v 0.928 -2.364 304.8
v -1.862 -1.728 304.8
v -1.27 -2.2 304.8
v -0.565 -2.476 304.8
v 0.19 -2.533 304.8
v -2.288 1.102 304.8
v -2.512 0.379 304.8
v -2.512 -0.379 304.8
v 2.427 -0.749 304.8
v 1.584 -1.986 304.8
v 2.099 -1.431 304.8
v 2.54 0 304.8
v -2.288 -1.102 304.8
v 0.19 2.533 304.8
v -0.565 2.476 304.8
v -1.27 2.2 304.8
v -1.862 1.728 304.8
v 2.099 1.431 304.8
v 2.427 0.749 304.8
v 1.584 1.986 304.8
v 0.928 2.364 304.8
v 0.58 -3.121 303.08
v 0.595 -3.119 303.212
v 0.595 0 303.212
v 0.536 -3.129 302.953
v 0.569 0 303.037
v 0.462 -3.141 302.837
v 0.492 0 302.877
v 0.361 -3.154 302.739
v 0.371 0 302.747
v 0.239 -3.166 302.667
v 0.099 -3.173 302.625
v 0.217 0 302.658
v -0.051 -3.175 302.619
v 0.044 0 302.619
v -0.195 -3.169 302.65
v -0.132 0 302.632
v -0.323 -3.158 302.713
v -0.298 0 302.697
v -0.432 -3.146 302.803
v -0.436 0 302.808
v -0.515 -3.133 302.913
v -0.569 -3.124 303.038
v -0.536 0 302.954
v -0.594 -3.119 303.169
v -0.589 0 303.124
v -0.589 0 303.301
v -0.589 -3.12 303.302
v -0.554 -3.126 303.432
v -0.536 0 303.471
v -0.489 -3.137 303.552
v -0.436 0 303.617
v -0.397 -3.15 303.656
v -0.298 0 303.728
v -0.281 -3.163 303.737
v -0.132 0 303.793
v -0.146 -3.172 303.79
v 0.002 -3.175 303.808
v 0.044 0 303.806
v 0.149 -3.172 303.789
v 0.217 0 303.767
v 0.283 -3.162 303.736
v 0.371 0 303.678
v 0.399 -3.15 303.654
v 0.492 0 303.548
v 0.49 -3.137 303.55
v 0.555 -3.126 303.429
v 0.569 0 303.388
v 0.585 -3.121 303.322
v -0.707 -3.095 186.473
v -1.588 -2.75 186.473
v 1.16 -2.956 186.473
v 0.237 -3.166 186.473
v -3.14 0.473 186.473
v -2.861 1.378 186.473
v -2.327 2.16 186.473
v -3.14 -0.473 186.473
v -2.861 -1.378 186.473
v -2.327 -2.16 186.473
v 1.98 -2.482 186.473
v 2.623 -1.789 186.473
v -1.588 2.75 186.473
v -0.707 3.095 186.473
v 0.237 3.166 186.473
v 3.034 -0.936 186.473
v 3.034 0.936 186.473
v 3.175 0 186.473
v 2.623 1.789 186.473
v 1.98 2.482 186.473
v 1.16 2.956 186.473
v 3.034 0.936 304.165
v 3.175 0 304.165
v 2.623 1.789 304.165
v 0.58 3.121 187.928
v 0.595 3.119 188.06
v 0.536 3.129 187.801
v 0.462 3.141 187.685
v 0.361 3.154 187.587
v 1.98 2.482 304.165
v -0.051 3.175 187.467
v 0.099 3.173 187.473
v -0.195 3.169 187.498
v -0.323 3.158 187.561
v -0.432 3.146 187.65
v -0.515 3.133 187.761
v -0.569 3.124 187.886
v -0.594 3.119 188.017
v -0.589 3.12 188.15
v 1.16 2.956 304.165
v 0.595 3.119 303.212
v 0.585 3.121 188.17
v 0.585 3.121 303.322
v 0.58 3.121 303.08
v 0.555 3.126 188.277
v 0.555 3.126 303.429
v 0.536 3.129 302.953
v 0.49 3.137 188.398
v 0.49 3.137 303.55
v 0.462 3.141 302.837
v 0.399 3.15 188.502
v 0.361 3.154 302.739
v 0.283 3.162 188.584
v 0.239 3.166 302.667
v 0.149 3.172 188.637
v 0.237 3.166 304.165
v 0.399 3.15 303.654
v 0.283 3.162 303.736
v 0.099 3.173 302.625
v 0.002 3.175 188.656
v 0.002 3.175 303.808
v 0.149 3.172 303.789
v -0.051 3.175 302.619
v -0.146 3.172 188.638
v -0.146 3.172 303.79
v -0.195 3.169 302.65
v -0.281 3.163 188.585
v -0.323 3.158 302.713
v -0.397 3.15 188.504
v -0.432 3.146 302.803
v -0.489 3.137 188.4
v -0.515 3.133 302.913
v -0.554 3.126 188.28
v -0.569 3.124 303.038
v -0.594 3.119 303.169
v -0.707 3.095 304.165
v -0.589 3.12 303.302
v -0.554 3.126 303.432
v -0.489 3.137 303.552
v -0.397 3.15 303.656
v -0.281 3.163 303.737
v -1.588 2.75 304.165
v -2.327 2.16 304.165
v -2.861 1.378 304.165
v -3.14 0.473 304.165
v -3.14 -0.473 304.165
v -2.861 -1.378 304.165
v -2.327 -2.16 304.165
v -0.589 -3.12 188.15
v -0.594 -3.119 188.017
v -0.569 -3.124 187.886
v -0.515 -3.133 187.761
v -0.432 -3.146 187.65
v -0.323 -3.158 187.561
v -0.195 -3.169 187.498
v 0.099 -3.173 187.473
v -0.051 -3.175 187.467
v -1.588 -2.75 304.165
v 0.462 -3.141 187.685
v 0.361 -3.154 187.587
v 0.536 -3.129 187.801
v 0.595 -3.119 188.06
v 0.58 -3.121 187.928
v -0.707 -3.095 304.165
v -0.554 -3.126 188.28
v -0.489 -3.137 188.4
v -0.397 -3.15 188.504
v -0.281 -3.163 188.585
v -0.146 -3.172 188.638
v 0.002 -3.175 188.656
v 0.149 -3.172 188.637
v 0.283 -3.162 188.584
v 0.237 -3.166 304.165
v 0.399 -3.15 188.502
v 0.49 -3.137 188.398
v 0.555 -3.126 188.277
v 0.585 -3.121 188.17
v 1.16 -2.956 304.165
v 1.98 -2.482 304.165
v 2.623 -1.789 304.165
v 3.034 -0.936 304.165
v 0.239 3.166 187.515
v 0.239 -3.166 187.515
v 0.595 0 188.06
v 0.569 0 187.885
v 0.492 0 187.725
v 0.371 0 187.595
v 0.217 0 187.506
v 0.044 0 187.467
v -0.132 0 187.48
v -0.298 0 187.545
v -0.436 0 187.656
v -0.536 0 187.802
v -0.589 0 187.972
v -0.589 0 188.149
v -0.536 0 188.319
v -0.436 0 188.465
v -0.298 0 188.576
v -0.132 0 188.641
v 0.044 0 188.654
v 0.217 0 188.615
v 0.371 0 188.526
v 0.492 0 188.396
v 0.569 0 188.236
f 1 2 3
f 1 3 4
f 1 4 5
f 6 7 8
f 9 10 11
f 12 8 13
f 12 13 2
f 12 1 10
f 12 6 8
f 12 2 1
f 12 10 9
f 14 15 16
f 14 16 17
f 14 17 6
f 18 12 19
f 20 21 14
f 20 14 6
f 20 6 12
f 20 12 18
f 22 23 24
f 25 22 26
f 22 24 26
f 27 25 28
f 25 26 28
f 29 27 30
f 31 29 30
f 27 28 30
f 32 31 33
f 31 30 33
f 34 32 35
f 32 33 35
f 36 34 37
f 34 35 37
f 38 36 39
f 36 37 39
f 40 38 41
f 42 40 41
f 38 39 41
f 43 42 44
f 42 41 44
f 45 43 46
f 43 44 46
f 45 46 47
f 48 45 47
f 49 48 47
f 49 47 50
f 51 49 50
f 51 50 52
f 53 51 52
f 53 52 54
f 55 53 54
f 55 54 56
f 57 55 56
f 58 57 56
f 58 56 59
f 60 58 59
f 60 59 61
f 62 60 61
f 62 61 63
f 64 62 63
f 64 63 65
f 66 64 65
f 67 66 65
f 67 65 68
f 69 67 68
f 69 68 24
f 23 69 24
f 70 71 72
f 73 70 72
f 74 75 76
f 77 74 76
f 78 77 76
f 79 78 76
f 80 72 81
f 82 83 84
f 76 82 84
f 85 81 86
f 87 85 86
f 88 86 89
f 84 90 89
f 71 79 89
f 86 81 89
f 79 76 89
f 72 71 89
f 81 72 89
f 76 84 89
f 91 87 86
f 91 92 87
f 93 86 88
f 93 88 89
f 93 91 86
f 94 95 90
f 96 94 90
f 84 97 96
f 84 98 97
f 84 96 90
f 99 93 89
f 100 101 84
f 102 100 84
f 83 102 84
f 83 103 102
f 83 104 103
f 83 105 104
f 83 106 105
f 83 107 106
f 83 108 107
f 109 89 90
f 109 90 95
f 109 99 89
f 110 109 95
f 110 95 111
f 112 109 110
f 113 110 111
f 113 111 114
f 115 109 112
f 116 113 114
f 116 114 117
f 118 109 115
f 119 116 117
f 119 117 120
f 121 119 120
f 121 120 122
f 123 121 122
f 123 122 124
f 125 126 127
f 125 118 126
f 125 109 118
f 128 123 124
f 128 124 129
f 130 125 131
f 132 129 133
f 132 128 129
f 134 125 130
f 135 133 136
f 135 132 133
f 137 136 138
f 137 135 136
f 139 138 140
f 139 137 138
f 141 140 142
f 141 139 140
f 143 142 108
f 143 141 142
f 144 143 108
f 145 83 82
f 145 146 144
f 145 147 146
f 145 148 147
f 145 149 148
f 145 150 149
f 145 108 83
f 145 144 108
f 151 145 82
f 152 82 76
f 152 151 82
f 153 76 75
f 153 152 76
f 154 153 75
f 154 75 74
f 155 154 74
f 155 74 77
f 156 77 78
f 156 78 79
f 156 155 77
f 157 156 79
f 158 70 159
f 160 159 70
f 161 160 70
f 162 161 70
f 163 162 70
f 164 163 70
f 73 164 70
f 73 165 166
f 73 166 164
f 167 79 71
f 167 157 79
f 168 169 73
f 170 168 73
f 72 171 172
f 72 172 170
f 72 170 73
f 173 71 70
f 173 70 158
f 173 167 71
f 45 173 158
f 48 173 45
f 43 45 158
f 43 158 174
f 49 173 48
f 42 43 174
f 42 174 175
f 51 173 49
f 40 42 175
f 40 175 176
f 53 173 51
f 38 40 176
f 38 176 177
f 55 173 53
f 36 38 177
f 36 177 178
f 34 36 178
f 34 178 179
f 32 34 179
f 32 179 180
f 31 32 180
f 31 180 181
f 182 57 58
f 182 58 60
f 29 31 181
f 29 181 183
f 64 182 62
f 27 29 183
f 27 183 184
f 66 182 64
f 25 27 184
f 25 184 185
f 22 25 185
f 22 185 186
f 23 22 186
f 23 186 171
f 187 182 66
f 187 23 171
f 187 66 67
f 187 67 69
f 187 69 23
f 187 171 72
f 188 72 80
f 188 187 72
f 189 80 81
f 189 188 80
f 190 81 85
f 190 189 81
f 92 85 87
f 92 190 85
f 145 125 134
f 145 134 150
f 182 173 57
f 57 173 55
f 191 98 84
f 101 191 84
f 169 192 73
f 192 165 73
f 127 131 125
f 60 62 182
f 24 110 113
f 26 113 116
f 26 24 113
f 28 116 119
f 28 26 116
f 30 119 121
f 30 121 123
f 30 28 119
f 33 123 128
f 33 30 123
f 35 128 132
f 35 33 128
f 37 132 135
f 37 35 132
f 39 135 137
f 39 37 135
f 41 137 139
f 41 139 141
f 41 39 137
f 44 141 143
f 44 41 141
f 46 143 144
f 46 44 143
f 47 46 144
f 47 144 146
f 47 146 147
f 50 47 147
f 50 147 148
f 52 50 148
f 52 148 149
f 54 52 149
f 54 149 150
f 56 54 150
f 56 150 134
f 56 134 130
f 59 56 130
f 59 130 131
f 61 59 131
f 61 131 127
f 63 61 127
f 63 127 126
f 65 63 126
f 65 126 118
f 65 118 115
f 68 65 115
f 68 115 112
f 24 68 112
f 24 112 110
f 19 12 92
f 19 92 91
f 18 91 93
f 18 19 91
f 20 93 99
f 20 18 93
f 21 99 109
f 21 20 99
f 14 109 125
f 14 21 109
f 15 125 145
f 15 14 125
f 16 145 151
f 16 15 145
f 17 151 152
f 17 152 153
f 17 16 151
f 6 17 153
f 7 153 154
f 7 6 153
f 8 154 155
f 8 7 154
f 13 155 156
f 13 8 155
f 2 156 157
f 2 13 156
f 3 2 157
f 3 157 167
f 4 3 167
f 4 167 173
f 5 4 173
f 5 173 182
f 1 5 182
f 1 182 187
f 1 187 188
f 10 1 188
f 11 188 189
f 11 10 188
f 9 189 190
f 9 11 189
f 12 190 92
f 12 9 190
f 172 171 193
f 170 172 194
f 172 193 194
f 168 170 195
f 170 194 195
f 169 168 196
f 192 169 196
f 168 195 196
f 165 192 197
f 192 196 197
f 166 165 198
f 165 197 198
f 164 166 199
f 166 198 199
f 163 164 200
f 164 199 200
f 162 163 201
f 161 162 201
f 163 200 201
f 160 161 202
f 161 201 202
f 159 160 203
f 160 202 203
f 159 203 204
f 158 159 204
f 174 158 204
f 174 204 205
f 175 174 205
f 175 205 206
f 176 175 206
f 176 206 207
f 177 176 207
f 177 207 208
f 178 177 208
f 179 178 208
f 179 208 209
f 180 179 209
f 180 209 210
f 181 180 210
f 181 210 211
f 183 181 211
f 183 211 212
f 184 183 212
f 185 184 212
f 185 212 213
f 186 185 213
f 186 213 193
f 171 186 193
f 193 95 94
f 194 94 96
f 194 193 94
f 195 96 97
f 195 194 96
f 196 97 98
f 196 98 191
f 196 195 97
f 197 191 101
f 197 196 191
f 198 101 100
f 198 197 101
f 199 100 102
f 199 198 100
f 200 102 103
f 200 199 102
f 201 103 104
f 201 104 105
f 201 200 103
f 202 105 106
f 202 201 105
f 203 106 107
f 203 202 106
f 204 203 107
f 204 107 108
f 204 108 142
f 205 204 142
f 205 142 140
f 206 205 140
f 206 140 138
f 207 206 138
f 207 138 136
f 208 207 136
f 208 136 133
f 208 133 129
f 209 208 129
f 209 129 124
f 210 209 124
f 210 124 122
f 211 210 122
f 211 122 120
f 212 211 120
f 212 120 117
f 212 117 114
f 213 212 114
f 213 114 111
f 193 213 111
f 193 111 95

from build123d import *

# Parameters (mm, degrees)
SKETCH3_R               = 3.175
BOSS_EXTRUDE1_DEPTH     = 304.8
CHAMFER1_SIZE           = 0.635
CUT_EXTRUDE1_START      = -118.327050112
SKETCH4_R               = 3.175
CUT_EXTRUDE1_DEPTH      = 492.272949888
SKETCH5_R               = 0.5953125
CUT_EXTRUDE2_DEPTH      = 4.175
CUT_EXTRUDE2_DEPTH_BACK = 4.175


with BuildPart() as part:
    # Sketch3 → Boss-Extrude1 (new body, symmetric)
    with BuildSketch(Plane.XY):
        Circle(SKETCH3_R)
    extrude(amount=BOSS_EXTRUDE1_DEPTH, both=True)

    # Chamfer1
    chamfer1_edges = [part.edges().sort_by_distance(p)[0] for p in [
        (-3.175, 0, -304.8),
        (-3.175, 0, 304.8),
    ]]
    chamfer(chamfer1_edges, length=CHAMFER1_SIZE)

    # Sketch4 → Cut-Extrude1 (cut, through all)
    with BuildSketch(Plane.XY.offset(304.8).offset(CUT_EXTRUDE1_START)):
        Circle(SKETCH4_R)
    extrude(amount=-CUT_EXTRUDE1_DEPTH, mode=Mode.SUBTRACT)

    # Sketch5 → Cut-Extrude2 (cut, two sides)
    with BuildSketch(Plane(origin=(0, 0, 0), x_dir=(1, 0, 0), z_dir=(0, 1, 0))) as cut_extrude2_sk:
        with Locations((0, -188.060449888)):
            Circle(SKETCH5_R)
        with Locations((0, -303.2125)):
            Circle(SKETCH5_R)
    extrude(amount=CUT_EXTRUDE2_DEPTH, mode=Mode.SUBTRACT)
    extrude(cut_extrude2_sk.sketch, amount=-CUT_EXTRUDE2_DEPTH_BACK, mode=Mode.SUBTRACT)


solid = part.part
